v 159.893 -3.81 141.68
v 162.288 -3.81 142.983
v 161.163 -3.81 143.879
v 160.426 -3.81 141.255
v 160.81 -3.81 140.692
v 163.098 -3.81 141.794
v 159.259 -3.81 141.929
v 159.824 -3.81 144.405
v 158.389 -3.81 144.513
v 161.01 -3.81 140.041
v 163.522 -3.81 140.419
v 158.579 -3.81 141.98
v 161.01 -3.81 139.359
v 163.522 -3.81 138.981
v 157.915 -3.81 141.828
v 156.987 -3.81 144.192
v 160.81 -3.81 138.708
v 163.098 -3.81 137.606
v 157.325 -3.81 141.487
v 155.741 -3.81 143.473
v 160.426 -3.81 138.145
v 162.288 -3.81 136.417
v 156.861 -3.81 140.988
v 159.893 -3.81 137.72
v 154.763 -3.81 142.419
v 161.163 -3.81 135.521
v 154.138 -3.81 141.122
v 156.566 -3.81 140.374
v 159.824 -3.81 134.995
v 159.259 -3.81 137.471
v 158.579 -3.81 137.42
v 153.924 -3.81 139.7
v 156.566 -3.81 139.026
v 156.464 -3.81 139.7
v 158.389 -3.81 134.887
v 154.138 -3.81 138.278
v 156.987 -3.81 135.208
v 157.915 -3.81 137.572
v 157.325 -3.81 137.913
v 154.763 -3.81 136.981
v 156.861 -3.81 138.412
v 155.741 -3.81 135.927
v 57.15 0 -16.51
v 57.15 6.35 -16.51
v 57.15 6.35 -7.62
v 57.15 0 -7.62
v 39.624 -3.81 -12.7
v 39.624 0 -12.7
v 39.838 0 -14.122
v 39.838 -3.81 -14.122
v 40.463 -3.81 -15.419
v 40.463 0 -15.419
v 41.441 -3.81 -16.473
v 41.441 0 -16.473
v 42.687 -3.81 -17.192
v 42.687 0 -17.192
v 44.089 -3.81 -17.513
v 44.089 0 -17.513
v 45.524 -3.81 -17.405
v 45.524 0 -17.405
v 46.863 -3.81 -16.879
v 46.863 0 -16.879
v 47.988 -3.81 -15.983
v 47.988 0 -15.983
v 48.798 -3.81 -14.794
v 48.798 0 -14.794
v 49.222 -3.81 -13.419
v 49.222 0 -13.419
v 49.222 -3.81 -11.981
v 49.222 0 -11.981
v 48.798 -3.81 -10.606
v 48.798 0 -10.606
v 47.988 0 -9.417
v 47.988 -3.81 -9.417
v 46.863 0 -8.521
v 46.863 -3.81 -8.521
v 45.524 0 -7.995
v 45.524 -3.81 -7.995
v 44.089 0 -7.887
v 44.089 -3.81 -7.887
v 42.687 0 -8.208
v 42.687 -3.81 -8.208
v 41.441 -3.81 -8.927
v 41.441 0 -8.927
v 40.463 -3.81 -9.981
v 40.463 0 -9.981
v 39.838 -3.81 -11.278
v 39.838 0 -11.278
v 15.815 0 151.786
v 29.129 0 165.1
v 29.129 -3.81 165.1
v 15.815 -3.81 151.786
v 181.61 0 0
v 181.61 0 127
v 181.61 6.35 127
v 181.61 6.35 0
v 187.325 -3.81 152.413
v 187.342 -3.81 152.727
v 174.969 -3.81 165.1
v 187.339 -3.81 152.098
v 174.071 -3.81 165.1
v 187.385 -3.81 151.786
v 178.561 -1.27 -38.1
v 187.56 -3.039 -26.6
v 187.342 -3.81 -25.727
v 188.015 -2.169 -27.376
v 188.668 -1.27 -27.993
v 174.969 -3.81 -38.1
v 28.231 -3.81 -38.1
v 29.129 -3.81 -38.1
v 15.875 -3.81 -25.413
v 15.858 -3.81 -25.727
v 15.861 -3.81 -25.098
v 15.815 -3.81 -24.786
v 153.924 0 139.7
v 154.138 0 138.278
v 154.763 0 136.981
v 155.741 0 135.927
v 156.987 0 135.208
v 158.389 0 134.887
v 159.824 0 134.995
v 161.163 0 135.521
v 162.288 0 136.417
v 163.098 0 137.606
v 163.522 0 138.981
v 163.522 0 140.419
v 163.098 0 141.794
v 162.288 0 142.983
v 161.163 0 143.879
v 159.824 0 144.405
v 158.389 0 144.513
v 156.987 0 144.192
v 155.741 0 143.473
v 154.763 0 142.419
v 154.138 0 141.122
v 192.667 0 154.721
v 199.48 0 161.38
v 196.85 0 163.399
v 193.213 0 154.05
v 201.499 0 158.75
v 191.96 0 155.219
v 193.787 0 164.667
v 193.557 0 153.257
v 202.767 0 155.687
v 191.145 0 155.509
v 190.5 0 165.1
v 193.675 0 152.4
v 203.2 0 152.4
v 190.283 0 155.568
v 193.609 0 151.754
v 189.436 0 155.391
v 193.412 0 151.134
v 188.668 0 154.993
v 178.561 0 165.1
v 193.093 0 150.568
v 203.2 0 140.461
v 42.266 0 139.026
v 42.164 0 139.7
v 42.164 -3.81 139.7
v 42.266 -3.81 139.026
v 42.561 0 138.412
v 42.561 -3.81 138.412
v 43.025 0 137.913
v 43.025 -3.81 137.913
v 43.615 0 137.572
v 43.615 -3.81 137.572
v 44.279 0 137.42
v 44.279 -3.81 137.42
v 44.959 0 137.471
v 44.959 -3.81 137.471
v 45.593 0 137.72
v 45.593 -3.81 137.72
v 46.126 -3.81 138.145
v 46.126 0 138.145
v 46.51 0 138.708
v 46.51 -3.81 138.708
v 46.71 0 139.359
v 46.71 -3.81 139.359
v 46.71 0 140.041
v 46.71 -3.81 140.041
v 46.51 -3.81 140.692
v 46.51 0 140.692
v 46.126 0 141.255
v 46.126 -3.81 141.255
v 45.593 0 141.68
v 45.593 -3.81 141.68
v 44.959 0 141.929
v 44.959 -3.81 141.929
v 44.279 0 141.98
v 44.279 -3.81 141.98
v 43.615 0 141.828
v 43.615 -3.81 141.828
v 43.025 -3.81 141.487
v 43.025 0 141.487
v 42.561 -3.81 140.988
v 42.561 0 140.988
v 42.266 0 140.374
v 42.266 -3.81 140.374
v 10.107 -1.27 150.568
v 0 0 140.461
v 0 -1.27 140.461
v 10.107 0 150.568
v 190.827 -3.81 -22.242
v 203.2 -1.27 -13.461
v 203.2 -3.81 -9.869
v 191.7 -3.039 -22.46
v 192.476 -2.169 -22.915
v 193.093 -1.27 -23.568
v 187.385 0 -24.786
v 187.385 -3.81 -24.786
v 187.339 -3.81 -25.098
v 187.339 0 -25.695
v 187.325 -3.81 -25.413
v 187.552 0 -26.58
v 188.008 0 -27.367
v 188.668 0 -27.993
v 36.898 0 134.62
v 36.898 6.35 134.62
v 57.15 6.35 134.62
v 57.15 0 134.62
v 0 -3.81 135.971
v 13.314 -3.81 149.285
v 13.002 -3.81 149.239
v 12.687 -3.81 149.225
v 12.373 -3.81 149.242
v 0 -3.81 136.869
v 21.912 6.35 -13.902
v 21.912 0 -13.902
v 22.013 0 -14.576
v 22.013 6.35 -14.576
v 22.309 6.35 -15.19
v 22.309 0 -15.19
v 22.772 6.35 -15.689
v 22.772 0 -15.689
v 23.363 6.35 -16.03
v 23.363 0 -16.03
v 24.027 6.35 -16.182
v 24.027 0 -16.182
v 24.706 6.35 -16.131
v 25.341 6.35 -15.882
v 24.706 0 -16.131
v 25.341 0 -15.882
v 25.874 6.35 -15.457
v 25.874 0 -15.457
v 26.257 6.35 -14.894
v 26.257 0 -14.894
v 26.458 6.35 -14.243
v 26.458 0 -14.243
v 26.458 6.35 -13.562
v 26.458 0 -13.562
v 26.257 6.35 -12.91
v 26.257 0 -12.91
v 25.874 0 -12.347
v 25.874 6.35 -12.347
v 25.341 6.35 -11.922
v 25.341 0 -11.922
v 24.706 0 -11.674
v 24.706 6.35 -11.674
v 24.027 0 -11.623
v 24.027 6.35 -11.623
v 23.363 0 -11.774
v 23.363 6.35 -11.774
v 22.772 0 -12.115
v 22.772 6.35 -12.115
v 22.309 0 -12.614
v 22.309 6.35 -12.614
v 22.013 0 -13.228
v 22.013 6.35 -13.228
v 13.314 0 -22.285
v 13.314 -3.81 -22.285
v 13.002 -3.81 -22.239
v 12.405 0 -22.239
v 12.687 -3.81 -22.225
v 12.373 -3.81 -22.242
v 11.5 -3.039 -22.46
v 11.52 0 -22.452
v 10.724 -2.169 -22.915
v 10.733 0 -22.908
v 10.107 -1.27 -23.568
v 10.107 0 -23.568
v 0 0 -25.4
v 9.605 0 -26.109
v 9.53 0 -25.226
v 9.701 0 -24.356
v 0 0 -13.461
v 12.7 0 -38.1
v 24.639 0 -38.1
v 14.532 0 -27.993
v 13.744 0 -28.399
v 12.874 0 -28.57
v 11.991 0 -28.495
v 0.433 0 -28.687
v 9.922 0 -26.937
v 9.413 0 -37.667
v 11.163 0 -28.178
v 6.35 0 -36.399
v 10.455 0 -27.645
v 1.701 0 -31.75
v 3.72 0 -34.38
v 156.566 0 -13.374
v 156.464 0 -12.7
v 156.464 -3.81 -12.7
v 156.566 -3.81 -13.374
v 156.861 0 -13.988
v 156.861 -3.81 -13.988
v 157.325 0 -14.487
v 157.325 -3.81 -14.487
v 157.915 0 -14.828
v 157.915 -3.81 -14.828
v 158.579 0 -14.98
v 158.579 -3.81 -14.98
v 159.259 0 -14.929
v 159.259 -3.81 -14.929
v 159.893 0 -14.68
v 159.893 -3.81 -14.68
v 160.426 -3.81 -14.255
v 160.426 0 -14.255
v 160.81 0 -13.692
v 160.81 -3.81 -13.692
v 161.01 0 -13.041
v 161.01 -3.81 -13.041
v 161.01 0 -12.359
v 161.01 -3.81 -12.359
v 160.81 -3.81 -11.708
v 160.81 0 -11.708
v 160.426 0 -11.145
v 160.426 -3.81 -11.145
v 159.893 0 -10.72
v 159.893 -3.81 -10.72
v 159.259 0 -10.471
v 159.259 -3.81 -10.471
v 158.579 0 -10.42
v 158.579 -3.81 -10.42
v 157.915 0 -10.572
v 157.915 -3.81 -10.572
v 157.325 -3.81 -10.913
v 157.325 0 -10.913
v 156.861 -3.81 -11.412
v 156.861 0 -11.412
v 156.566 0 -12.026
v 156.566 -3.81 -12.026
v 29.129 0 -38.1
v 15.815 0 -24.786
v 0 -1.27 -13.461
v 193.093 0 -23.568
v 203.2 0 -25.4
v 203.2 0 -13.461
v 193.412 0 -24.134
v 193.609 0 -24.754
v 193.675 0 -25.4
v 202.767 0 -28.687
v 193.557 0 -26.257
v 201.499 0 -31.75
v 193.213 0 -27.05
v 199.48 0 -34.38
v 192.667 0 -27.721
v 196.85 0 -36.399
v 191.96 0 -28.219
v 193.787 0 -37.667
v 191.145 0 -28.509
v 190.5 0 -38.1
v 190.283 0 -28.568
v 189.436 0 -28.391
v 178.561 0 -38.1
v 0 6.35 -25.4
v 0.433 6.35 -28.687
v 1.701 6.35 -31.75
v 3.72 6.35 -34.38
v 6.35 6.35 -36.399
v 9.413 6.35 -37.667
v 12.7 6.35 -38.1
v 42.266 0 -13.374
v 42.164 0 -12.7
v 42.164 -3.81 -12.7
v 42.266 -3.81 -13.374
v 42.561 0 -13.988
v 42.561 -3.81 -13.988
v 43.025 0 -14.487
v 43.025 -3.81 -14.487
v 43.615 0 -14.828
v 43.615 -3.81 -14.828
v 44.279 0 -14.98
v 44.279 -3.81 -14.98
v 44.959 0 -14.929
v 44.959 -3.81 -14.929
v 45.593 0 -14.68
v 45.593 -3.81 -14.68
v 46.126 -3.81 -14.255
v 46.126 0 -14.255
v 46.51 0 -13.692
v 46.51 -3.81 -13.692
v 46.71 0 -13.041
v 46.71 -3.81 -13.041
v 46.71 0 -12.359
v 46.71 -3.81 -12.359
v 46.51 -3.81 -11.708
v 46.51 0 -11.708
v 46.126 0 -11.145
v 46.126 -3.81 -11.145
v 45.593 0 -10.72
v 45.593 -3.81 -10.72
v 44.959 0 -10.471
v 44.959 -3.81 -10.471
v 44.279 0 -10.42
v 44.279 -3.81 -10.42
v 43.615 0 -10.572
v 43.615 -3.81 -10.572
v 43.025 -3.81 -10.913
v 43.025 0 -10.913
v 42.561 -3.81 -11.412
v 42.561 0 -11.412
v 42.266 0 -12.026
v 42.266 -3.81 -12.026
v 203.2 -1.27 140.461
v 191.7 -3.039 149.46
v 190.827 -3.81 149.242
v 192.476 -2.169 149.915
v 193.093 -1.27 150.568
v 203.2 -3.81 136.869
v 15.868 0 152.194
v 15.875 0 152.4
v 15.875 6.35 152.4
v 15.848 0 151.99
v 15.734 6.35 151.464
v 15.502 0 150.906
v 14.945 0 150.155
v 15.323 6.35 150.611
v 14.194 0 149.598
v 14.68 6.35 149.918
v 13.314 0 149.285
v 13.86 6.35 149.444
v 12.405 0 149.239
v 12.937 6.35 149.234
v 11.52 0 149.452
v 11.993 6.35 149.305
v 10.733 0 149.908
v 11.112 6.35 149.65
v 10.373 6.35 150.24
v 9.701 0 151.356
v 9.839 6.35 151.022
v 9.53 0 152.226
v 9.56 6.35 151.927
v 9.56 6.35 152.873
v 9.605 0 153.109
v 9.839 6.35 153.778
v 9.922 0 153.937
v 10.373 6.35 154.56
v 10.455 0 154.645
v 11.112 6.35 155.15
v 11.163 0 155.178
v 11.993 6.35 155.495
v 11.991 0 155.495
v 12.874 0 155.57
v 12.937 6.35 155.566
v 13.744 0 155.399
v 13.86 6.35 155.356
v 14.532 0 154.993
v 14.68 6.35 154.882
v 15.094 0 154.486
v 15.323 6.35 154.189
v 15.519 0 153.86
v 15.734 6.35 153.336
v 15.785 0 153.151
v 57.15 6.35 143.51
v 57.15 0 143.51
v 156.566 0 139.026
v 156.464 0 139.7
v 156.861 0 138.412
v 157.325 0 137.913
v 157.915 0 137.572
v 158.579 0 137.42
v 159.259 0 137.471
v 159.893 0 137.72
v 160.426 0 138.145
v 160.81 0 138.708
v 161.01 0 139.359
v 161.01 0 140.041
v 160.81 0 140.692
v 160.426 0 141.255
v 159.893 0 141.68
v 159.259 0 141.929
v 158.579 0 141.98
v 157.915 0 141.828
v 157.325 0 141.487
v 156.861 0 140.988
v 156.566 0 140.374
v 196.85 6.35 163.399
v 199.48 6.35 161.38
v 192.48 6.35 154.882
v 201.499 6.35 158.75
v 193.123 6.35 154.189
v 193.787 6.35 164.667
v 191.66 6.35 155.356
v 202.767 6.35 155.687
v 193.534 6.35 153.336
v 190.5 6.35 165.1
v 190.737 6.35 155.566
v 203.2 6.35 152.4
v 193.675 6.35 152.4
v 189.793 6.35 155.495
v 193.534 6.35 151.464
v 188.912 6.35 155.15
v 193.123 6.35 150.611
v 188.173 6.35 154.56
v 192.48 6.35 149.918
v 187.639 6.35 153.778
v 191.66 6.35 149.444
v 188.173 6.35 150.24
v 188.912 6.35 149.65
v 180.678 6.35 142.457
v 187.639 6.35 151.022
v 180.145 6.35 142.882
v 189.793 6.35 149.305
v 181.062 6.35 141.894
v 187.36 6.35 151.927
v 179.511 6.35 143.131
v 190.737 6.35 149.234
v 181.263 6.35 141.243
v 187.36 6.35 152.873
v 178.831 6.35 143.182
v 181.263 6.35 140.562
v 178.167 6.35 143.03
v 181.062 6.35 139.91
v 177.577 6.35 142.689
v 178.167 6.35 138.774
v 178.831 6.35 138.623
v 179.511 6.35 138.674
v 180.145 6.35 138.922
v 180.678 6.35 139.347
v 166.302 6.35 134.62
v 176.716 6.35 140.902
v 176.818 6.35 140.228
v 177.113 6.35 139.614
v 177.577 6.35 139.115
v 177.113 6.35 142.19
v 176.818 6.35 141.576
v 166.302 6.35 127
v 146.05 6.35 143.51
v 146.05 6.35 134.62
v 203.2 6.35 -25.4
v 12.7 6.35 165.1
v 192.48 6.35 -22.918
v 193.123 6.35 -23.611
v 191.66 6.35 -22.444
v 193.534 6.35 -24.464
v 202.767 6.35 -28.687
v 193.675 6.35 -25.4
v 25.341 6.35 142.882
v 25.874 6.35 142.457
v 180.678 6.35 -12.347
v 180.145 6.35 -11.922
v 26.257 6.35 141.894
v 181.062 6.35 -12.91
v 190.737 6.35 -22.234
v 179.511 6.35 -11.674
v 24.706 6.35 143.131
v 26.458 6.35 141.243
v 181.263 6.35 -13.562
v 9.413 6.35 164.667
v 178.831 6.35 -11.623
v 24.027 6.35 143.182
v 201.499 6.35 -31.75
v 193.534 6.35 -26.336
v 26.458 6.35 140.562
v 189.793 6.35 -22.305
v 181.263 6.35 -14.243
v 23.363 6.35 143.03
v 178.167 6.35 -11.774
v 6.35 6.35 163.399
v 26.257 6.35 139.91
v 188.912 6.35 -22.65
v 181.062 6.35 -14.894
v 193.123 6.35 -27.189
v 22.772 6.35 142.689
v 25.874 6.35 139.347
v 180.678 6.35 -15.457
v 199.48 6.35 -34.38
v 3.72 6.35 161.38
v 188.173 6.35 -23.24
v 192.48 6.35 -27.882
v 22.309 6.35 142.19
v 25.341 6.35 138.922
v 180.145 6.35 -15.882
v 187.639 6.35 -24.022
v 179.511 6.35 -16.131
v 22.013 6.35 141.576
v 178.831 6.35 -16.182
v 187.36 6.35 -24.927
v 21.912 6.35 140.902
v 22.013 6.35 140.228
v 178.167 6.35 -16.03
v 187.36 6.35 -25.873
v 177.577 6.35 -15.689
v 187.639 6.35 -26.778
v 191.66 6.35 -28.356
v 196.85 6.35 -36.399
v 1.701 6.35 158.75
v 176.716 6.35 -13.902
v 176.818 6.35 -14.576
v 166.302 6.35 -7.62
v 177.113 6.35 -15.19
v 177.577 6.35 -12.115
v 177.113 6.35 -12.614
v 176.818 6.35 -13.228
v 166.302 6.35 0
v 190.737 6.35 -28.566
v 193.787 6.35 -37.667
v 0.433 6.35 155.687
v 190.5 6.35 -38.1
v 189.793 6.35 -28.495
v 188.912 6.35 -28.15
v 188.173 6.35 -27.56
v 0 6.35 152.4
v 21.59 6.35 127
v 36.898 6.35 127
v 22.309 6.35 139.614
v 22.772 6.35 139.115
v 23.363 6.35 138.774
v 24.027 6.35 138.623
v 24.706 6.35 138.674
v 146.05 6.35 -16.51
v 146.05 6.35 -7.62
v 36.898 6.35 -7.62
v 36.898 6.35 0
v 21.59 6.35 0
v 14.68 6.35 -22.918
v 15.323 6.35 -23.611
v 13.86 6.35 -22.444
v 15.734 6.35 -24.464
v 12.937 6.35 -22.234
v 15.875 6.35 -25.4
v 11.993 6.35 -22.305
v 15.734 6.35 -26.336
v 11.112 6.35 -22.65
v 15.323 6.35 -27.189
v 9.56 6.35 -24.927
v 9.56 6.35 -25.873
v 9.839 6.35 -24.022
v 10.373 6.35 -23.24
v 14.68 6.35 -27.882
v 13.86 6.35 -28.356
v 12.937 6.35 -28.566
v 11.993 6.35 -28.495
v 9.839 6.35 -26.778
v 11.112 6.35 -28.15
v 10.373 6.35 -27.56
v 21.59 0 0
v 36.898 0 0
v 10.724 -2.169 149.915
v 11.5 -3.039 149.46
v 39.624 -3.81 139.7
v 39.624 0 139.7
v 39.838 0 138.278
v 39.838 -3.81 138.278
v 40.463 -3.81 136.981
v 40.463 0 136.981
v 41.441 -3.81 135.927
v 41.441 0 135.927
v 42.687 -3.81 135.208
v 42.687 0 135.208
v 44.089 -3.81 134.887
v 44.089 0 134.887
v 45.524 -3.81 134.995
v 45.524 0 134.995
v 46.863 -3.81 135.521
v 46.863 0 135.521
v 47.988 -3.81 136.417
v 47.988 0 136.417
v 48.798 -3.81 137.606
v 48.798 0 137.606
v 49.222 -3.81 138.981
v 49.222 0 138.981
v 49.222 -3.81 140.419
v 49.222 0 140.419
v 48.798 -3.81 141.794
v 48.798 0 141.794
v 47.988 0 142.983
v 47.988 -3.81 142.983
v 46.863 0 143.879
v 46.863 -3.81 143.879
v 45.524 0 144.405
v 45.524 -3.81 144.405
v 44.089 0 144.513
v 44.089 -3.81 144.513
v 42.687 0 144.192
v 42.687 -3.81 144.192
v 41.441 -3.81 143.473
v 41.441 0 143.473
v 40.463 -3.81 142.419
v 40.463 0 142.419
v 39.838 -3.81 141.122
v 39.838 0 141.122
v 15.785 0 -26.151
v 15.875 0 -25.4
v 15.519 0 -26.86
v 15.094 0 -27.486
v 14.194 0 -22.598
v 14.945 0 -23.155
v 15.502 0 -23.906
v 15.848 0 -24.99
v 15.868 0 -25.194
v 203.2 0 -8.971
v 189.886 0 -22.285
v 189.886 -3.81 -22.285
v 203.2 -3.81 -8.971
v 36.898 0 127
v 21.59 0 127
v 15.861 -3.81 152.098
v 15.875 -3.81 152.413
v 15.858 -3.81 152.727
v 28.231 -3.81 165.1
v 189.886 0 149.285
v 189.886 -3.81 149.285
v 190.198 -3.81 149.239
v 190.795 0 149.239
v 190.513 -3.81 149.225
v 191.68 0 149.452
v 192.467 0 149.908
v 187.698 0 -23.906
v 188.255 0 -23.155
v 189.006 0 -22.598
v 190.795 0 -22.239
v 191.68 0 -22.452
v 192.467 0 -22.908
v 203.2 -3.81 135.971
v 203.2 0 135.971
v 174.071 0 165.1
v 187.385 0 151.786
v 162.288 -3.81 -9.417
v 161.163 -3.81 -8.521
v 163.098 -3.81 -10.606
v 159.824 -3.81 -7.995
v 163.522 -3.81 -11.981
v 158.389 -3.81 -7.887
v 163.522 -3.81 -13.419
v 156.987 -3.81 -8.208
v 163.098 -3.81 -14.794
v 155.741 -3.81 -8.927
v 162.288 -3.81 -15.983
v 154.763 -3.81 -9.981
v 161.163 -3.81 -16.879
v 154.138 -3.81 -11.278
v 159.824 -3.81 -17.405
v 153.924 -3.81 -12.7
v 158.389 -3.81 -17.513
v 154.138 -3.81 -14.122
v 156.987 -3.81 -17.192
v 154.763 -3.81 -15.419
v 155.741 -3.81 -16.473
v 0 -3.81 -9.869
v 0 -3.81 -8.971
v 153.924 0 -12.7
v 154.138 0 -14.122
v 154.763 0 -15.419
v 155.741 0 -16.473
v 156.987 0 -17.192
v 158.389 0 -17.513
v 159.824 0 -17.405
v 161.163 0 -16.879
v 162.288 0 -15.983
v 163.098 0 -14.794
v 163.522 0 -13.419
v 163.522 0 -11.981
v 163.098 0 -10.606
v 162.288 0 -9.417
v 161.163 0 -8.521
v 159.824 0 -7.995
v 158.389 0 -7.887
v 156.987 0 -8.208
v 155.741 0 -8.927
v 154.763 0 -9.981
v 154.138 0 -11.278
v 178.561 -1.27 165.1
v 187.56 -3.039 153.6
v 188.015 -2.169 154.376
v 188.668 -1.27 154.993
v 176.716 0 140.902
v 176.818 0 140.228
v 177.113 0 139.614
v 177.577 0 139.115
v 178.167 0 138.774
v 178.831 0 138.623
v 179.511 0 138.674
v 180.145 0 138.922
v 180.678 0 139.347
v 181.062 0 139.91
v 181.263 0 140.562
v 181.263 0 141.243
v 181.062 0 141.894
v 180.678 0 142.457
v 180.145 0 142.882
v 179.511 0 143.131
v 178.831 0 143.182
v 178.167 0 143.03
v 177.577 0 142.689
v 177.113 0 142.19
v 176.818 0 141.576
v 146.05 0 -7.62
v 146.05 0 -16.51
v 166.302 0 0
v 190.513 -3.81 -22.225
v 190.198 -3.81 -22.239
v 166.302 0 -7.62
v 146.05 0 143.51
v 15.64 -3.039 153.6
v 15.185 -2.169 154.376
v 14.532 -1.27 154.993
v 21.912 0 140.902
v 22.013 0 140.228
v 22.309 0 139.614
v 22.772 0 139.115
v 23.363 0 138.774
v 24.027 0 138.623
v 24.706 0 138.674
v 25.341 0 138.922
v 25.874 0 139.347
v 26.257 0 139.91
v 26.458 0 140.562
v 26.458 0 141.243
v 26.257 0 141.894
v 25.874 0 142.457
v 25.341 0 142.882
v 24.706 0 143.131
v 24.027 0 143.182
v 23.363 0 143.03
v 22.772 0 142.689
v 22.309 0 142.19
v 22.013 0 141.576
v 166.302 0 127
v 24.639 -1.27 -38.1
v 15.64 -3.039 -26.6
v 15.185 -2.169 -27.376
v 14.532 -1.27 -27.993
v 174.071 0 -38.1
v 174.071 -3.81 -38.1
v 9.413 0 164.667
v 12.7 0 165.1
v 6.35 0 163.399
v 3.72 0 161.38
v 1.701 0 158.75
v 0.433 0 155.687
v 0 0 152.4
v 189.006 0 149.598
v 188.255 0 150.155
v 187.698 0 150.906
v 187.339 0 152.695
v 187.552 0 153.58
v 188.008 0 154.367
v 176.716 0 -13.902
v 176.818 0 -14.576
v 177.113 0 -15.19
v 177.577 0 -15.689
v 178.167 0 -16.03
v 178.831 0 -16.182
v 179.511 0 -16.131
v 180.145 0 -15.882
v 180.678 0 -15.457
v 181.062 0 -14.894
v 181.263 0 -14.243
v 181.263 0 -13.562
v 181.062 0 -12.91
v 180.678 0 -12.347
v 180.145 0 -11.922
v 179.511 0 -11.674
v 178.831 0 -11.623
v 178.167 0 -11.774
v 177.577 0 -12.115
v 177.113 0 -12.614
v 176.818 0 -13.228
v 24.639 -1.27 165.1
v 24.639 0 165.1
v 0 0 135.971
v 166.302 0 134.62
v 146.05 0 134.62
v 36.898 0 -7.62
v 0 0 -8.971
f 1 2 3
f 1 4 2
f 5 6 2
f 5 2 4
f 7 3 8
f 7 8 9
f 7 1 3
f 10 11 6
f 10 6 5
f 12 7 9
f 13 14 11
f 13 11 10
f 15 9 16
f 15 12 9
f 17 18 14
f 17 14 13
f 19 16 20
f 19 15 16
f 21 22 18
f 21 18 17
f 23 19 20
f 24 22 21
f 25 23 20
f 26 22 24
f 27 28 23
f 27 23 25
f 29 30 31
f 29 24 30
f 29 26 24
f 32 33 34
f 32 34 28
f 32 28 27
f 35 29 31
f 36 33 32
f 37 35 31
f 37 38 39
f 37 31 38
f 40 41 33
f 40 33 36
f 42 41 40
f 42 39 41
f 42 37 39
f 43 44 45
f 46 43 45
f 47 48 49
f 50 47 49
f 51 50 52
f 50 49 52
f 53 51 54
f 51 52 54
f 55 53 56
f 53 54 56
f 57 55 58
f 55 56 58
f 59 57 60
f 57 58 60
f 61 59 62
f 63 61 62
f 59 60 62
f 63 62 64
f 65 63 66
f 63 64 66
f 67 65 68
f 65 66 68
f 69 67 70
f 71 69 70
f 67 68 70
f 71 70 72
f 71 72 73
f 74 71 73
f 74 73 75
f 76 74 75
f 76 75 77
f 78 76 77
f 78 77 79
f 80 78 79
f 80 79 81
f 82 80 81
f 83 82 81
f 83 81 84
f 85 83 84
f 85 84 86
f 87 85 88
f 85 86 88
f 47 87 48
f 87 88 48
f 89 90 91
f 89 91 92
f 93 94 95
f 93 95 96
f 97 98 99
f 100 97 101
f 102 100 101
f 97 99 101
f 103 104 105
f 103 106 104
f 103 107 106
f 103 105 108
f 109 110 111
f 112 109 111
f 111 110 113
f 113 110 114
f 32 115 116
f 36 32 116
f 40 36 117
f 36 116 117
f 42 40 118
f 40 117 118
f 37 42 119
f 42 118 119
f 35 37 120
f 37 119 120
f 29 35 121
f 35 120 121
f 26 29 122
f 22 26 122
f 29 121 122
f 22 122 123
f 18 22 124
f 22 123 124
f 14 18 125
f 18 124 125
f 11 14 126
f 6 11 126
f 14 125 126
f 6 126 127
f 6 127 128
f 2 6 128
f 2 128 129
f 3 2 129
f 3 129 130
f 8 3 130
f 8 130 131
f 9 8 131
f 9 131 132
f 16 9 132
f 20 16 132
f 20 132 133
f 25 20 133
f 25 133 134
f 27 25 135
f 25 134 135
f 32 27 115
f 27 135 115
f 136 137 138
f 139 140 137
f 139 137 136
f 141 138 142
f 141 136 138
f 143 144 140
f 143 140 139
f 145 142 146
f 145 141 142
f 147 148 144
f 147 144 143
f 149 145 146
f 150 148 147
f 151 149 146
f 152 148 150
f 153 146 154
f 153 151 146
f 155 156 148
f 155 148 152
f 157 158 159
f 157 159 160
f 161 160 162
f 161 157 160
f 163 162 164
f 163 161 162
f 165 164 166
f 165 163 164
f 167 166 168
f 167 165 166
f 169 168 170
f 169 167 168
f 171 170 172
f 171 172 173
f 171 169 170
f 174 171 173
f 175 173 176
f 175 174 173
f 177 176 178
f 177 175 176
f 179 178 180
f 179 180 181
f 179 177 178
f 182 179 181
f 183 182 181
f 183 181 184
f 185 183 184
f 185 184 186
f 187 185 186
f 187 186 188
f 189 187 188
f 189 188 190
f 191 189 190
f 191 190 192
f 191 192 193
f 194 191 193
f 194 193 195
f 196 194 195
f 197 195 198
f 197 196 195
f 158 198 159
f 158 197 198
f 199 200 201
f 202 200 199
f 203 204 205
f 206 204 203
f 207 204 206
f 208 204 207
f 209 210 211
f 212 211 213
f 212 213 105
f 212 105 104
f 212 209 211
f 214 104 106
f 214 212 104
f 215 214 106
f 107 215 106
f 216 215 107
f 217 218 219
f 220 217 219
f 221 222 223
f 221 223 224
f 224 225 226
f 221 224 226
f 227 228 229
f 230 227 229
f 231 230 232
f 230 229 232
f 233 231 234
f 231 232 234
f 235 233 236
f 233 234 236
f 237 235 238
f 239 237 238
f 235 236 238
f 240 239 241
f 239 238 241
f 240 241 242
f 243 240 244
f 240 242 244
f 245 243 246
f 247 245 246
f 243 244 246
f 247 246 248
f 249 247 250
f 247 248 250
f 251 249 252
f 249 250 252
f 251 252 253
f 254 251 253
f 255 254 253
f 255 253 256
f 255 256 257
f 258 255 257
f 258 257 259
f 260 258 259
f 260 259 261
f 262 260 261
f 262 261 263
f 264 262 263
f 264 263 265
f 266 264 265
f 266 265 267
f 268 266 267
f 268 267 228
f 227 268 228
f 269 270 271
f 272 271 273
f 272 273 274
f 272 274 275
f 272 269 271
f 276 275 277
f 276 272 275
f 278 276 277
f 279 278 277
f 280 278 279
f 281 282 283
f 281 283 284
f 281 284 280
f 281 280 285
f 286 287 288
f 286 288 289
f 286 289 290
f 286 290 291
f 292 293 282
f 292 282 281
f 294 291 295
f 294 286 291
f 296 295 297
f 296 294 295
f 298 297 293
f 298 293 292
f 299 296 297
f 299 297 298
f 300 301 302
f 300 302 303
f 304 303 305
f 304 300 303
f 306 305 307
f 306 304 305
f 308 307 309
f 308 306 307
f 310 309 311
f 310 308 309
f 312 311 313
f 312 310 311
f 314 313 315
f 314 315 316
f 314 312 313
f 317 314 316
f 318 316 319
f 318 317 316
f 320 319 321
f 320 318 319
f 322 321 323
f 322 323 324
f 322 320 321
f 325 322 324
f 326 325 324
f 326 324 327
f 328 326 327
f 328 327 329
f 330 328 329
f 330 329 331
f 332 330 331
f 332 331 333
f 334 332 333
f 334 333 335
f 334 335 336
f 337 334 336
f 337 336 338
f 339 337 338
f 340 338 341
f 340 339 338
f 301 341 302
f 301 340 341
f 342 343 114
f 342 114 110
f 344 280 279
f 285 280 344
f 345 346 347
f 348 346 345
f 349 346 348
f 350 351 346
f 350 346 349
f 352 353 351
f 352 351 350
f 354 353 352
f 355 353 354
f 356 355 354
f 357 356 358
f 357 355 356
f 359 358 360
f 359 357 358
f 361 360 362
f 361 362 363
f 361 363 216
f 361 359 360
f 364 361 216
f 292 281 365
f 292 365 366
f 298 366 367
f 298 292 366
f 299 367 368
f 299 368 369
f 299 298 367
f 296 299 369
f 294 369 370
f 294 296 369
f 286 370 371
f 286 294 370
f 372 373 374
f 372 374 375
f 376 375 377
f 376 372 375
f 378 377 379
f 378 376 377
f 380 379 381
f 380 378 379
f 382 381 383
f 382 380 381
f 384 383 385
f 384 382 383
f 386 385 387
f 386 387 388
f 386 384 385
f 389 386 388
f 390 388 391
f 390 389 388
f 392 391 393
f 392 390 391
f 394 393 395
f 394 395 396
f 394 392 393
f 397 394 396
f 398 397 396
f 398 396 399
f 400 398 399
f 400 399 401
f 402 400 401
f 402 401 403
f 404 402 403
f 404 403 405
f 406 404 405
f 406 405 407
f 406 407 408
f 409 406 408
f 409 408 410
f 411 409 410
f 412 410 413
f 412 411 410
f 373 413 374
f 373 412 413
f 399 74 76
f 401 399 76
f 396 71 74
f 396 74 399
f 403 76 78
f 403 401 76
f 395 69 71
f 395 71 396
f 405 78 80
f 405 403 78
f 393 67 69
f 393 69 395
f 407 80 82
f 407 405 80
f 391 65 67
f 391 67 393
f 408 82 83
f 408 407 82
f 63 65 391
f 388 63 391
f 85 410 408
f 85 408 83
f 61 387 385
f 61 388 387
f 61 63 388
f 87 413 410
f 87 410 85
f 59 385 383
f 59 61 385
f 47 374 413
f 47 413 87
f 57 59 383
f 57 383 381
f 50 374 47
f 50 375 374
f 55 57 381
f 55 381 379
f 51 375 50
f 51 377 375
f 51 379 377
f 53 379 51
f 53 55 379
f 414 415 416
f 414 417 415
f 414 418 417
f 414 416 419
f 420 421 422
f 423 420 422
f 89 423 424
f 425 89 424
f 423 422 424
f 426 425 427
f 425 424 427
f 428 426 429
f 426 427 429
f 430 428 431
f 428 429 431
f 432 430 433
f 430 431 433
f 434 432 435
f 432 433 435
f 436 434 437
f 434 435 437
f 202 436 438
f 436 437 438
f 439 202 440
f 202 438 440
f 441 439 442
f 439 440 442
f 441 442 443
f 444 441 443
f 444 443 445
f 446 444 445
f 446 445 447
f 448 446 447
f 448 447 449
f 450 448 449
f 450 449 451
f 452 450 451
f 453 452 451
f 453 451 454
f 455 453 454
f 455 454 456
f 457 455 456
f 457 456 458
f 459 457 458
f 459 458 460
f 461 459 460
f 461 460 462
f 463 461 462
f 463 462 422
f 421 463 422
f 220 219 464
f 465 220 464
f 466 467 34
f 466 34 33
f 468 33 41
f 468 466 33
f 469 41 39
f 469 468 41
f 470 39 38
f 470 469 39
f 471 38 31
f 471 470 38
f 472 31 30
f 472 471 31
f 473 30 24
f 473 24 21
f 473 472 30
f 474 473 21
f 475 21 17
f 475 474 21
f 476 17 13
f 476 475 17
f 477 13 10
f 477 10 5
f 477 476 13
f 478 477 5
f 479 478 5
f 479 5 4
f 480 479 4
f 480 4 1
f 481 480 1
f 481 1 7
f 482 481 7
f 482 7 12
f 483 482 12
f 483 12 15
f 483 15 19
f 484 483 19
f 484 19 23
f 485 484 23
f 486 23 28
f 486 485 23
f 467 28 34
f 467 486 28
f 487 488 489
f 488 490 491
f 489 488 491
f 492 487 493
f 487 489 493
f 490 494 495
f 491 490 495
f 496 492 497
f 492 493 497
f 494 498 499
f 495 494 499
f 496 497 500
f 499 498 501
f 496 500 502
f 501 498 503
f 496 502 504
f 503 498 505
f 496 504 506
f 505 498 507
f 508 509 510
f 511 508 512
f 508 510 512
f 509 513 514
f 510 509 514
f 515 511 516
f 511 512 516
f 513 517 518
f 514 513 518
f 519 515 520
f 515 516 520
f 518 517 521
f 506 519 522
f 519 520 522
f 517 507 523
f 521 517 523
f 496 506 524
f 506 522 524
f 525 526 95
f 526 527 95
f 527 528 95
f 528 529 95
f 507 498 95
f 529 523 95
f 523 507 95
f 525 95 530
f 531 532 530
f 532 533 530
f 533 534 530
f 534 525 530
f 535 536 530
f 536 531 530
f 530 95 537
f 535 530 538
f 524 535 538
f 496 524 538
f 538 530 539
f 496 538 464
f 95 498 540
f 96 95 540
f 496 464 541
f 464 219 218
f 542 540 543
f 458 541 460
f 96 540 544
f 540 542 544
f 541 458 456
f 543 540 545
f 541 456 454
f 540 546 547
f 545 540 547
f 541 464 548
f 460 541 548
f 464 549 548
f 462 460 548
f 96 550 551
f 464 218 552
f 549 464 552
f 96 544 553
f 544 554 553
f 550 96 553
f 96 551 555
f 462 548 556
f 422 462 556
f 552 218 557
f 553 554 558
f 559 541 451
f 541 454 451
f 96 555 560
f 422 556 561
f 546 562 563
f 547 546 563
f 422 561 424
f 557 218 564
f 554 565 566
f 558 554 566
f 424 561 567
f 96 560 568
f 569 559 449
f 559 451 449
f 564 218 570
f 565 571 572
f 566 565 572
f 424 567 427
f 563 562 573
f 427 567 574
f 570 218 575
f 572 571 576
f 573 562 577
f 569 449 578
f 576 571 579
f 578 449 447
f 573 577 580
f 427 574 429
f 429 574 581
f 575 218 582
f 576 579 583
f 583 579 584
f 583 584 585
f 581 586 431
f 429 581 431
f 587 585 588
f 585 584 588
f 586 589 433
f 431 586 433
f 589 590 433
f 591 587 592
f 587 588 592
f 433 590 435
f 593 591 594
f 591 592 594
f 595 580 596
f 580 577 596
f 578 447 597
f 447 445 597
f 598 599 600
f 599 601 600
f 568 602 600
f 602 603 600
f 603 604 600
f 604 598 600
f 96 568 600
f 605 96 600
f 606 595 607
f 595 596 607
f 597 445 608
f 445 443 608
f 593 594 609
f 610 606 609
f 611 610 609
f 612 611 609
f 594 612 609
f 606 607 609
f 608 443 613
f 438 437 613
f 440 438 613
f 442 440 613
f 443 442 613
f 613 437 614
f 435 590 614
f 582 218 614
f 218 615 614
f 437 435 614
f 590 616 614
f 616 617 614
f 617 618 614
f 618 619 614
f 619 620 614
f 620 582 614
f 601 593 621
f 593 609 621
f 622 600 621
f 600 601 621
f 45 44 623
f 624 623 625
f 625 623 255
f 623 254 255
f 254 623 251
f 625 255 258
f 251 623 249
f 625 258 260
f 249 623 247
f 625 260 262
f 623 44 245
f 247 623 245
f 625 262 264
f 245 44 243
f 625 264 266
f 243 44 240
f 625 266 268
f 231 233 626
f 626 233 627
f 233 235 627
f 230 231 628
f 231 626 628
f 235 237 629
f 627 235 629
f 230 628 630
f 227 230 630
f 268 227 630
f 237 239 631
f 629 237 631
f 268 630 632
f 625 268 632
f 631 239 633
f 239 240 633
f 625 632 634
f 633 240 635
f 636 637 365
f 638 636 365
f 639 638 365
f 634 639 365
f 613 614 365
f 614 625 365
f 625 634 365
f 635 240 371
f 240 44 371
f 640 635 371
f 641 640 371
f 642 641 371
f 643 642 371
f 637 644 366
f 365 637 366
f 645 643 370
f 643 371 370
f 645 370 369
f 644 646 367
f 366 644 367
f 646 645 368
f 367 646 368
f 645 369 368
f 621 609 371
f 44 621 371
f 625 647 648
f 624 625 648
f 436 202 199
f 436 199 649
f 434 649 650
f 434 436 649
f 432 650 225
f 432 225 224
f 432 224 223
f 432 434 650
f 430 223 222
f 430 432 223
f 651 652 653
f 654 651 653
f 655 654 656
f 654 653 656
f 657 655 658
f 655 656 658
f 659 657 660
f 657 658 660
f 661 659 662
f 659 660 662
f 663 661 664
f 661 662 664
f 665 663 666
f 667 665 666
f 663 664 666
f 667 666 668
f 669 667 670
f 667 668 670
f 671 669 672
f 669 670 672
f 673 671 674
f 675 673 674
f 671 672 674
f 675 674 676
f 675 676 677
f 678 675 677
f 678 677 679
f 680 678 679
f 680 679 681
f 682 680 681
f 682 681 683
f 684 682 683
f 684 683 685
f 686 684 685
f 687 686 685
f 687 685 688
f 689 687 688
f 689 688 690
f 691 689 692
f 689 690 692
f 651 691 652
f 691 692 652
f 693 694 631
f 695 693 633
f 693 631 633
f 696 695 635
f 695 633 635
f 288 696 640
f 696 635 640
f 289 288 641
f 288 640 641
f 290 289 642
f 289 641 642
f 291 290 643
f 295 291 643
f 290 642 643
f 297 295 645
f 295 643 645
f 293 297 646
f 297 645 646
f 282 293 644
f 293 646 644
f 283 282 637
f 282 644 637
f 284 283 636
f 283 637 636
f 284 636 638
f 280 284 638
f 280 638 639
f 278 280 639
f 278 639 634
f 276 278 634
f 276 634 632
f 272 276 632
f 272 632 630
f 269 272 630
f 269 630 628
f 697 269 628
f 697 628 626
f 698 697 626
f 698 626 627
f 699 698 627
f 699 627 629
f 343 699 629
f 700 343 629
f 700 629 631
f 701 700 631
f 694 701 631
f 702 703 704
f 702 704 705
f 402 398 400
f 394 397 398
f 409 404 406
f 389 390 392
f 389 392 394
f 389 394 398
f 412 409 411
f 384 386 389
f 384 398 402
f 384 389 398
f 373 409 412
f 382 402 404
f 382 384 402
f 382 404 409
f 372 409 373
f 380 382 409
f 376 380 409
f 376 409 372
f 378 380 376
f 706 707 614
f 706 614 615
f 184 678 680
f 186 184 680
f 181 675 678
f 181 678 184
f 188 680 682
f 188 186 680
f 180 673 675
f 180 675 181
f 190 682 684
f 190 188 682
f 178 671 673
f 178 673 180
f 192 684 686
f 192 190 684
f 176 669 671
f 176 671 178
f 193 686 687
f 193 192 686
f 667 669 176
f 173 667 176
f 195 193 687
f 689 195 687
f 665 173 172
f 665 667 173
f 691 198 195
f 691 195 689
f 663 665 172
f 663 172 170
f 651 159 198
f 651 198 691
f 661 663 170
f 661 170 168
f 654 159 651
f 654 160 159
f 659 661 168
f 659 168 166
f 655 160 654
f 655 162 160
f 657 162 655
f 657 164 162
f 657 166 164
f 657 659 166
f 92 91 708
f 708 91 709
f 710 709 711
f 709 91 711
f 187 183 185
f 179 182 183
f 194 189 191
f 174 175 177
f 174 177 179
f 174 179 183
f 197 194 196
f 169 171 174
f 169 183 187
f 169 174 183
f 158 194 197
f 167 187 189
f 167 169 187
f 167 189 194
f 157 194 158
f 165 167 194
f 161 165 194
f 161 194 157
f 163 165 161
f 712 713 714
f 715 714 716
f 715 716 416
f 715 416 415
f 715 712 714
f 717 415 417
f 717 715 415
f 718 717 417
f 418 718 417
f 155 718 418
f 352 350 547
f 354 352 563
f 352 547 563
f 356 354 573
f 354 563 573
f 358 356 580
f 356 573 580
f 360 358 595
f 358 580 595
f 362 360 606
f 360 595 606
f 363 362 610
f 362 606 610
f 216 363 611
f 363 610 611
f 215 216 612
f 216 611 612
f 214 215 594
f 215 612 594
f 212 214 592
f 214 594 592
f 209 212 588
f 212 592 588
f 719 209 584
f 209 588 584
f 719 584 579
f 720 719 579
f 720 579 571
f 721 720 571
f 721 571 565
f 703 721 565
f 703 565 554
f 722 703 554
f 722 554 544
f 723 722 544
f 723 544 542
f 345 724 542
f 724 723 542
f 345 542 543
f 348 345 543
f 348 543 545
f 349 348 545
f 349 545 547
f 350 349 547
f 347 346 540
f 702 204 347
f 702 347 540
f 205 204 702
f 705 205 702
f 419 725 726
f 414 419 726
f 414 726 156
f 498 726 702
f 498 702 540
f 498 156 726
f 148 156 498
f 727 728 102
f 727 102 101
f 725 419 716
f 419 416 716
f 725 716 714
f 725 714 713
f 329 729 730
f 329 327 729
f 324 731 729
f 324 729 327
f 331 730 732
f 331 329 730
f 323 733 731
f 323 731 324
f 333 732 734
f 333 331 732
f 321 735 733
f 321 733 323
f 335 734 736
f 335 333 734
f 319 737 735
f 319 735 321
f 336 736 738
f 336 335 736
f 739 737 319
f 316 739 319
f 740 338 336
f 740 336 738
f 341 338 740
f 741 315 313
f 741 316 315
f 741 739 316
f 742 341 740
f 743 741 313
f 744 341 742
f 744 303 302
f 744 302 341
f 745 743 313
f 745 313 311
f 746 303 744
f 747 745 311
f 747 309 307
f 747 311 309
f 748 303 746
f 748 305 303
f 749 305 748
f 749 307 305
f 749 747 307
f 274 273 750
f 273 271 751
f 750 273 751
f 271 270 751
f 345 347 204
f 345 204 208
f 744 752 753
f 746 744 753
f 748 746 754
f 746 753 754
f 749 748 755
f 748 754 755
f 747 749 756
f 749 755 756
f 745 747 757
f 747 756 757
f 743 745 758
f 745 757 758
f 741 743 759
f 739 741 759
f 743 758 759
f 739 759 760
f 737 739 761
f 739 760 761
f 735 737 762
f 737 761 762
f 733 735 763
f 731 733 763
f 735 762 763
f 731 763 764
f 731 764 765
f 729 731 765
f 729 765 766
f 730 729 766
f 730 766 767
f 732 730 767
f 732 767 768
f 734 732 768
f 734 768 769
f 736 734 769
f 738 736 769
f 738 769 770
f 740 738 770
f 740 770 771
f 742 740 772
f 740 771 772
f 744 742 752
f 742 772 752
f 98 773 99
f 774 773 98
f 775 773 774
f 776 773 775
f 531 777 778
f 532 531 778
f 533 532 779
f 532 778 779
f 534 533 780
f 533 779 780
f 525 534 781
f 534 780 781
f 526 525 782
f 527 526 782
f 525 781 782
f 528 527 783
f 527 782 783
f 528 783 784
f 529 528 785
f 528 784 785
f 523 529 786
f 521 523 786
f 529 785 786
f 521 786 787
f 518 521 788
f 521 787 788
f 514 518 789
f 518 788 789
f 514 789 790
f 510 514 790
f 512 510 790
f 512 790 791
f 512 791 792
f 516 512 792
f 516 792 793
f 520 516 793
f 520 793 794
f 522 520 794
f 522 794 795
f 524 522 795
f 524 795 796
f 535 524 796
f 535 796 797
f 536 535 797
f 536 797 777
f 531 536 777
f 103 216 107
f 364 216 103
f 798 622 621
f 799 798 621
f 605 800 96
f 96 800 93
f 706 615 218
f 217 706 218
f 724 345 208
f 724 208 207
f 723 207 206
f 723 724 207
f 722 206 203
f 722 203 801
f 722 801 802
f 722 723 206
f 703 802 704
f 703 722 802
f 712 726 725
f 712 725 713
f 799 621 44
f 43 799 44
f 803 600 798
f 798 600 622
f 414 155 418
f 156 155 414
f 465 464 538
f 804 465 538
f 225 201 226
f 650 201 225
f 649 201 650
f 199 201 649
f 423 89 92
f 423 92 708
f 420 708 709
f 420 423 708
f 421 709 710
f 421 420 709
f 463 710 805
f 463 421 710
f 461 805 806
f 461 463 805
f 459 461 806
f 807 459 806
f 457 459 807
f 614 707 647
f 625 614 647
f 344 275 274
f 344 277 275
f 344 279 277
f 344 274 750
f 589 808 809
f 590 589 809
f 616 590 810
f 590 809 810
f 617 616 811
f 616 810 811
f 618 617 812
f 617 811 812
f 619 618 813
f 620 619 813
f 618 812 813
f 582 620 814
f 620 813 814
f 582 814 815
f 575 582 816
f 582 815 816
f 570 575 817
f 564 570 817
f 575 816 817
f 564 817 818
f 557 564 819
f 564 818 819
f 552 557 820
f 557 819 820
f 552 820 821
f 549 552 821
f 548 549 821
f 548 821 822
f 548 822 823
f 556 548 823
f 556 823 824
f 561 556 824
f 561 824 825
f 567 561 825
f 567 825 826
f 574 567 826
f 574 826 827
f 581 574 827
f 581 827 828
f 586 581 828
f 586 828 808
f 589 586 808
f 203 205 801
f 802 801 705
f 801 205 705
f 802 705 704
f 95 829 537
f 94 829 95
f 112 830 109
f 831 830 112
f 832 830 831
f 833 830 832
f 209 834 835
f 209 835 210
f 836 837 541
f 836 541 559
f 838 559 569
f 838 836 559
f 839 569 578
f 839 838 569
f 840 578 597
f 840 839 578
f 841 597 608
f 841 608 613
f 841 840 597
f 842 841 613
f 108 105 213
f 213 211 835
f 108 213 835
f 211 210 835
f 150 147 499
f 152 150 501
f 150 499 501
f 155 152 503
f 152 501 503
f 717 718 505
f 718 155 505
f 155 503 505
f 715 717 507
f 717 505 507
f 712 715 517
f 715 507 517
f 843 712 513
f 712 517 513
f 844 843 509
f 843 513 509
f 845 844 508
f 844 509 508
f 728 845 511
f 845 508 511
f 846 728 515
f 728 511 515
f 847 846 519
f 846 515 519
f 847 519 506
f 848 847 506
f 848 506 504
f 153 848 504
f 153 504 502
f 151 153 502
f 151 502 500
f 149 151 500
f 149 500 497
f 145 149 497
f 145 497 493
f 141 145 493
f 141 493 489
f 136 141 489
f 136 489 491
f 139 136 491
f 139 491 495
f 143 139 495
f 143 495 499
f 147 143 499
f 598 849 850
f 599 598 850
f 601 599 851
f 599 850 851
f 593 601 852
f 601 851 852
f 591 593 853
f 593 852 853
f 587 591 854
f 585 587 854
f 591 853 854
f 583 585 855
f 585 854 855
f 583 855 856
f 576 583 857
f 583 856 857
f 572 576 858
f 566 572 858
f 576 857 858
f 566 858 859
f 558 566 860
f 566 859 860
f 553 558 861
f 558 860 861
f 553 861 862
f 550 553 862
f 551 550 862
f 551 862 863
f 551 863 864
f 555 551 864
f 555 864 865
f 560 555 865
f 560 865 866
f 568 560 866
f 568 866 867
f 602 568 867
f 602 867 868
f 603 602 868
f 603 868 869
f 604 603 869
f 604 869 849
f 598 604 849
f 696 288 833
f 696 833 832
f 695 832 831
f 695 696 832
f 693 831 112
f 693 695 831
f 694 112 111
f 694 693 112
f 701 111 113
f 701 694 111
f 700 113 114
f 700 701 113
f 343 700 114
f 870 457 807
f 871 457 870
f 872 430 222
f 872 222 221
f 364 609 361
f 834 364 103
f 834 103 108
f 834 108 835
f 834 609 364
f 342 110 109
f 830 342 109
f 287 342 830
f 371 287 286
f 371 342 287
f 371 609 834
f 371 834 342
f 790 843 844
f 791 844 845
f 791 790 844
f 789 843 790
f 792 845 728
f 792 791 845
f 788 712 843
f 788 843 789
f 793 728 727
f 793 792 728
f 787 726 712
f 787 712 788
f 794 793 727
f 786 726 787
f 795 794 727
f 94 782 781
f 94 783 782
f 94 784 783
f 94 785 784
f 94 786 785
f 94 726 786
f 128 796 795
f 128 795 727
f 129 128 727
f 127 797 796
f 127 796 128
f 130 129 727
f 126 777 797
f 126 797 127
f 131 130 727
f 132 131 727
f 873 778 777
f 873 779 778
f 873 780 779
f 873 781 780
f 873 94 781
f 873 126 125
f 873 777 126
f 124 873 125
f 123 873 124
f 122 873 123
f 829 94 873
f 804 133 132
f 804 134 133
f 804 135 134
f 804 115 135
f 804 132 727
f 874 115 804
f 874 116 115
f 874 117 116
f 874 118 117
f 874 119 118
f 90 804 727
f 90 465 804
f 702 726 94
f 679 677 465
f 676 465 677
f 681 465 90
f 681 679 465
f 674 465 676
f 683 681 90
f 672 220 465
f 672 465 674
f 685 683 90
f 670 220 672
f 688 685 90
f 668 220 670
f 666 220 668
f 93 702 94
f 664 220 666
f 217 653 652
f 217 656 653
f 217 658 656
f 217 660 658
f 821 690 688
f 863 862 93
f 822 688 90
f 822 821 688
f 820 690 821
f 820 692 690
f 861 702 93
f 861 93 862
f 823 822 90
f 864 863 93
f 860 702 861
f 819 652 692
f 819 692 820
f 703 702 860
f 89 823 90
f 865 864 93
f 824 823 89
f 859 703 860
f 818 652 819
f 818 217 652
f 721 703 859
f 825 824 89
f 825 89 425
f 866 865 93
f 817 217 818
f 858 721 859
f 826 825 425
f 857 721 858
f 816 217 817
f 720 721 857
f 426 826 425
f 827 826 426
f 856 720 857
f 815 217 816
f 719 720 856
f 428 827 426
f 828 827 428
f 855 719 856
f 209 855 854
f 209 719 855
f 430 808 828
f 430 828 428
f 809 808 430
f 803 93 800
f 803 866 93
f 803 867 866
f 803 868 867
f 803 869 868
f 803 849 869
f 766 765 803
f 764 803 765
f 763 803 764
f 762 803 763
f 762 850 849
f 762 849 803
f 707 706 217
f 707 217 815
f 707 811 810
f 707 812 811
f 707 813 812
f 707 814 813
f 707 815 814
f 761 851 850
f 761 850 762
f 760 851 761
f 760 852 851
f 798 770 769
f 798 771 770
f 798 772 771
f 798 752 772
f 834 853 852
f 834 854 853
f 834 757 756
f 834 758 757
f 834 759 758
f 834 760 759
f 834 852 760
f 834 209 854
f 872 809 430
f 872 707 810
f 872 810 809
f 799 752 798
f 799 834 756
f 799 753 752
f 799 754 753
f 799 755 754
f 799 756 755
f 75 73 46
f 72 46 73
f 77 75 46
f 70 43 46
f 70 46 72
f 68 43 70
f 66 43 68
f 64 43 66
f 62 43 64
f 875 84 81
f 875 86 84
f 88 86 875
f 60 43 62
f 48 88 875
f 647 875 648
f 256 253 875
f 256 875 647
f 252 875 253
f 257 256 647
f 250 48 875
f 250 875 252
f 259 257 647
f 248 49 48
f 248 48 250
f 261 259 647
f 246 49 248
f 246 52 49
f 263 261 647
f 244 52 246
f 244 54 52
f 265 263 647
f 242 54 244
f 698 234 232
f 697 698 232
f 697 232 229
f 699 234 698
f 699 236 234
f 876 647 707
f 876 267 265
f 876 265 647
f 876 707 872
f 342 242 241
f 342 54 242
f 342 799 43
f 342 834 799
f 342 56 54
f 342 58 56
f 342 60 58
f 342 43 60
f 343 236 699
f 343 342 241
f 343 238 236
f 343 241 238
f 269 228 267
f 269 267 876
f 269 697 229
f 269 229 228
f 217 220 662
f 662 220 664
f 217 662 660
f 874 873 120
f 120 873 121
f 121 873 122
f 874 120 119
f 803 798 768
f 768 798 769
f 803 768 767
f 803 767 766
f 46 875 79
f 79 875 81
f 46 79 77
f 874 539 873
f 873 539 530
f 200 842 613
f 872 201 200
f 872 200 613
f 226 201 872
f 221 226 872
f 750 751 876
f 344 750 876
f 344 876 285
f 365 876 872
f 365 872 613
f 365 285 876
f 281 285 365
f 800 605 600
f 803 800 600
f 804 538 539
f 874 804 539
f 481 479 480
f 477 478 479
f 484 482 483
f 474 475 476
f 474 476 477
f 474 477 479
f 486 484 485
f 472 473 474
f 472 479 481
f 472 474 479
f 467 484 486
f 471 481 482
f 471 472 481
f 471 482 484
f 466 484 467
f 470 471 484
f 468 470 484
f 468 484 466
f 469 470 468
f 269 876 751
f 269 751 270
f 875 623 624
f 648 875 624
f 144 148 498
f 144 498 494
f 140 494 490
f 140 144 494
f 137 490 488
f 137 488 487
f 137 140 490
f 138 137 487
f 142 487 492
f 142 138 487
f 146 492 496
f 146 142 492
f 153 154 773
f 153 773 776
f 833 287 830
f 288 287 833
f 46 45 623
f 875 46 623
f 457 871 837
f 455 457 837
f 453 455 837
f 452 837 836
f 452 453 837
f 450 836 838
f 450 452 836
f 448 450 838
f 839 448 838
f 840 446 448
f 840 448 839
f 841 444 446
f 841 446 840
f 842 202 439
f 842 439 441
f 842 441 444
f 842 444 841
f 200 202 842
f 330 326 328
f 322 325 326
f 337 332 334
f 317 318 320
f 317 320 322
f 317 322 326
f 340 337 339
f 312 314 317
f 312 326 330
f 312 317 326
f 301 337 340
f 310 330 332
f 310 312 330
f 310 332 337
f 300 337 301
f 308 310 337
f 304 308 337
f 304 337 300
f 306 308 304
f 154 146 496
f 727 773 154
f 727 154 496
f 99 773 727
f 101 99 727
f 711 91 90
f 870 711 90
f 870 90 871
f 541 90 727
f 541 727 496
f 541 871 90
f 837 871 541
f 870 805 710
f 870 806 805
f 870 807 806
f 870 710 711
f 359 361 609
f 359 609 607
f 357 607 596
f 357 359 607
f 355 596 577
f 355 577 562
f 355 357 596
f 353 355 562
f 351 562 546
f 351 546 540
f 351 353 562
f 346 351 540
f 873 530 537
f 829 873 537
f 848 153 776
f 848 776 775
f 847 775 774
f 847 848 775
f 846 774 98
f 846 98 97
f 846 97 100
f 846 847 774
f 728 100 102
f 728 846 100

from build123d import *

# Parameters (mm, degrees)
SKETCH1_W           = 160.02
SKETCH1_H           = 127
BOSS_EXTRUDE2_DEPTH = 6.35
SKETCH2_R           = 3.175
CUT_EXTRUDE1_DEPTH  = 7.35
SKETCH8_R           = 2.286
CUT_EXTRUDE4_DEPTH  = 7.35
SKETCH10_R          = 4.826
SKETCH10_R_2        = 2.286
BOSS_EXTRUDE3_DEPTH = 3.81
BOSS_EXTRUDE4_DEPTH = 3.81
CHAMFER1_SIZE       = 2.54
CUT_EXTRUDE5_DEPTH  = 11.16


with BuildPart() as part:
    # Sketch1 → Boss-Extrude2 (new body)
    with BuildSketch(Plane(origin=(0, 0, 0), x_dir=(1, 0, 0), z_dir=(0, 1, 0))):
        with BuildLine():
            Line((0, 0), (0, 25.4))
            ThreePointArc((0, 25.4), (3.719743879, 34.380256121), (12.7, 38.1))
            Line((12.7, 38.1), (190.5, 38.1))
            ThreePointArc((190.5, 38.1), (199.480256121, 34.380256121), (203.2, 25.4))
            Line((203.2, 25.4), (203.2, -152.4))
            ThreePointArc((203.2, -152.4), (199.480256121, -161.380256121), (190.5, -165.1))
            Line((190.5, -165.1), (12.7, -165.1))
            ThreePointArc((12.7, -165.1), (3.719743879, -161.380256121), (0, -152.4))
            Line((0, -152.4), (0, -127))
            Line((0, -127), (0, 0))
        make_face()
        with Locations((101.6, -63.5)):
            Rectangle(SKETCH1_W, SKETCH1_H, mode=Mode.SUBTRACT)
    extrude(amount=BOSS_EXTRUDE2_DEPTH)

    # Sketch2 → Cut-Extrude1 (cut, through all)
    with BuildSketch(Plane(origin=(0, 6.35, 0), x_dir=(1, 0, 0), z_dir=(0, 1, 0))):
        with Locations((12.7, 25.4)):
            Circle(SKETCH2_R)
        with Locations((190.5, 25.4)):
            Circle(SKETCH2_R)
        with Locations((190.5, -152.4)):
            Circle(SKETCH2_R)
        with Locations((12.7, -152.4)):
            Circle(SKETCH2_R)
    extrude(amount=-CUT_EXTRUDE1_DEPTH, mode=Mode.SUBTRACT)

    # Sketch8 → Cut-Extrude4 (cut, through all)
    with BuildSketch(Plane(origin=(0, 0, 0), x_dir=(-1, 0, 0), z_dir=(0, -1, 0))):
        with Locations((-24.197781122, 13.902218878)):
            Circle(SKETCH8_R)
        with Locations((-24.197781122, -140.902218878)):
            Circle(SKETCH8_R)
        with Locations((-179.002218878, -140.902218878)):
            Circle(SKETCH8_R)
        with Locations((-179.002218878, 13.902218878)):
            Circle(SKETCH8_R)
    extrude(amount=-CUT_EXTRUDE4_DEPTH, mode=Mode.SUBTRACT)

    # Sketch10 → Boss-Extrude3 (add)
    with BuildSketch(Plane(origin=(0, 0, 0), x_dir=(-1, 0, 0), z_dir=(0, -1, 0))):
        with Locations((-44.45, 12.7)):
            Circle(SKETCH10_R)
        with Locations((-44.45, 12.7)):
            Circle(SKETCH10_R_2, mode=Mode.SUBTRACT)
        with Locations((-158.75, 12.7)):
            Circle(SKETCH10_R)
        with Locations((-158.75, 12.7)):
            Circle(SKETCH10_R_2, mode=Mode.SUBTRACT)
        with Locations((-158.75, -139.7)):
            Circle(SKETCH10_R)
        with Locations((-158.75, -139.7)):
            Circle(SKETCH10_R_2, mode=Mode.SUBTRACT)
        with Locations((-44.45, -139.7)):
            Circle(SKETCH10_R)
        with Locations((-44.45, -139.7)):
            Circle(SKETCH10_R_2, mode=Mode.SUBTRACT)
    extrude(amount=BOSS_EXTRUDE3_DEPTH)

    # Sketch11 → Boss-Extrude4 (add)
    with BuildSketch(Plane.XZ):
        with BuildLine():
            Line((174.07128, -38.1), (187.384850533, -24.786429467))
            ThreePointArc((187.384850533, -24.786429467), (187.552268433, -26.579620112), (188.668154157, -27.993253903))
            Line((188.668154157, -27.993253903), (178.561408061, -38.1))
            Line((178.561408061, -38.1), (174.07128, -38.1))
        make_face()
        with BuildLine():
            Line((203.2, -8.97128), (203.2, -13.461408061))
            Line((203.2, -13.461408061), (193.093253903, -23.568154157))
            ThreePointArc((193.093253903, -23.568154157), (191.679620112, -22.452268433), (189.886429467, -22.284850533))
            Line((189.886429467, -22.284850533), (203.2, -8.97128))
        make_face()
        with BuildLine():
            Line((10.106746097, -23.568154157), (0, -13.461408061))
            Line((0, -13.461408061), (0, -8.97128))
            Line((0, -8.97128), (13.313570533, -22.284850533))
            ThreePointArc((13.313570533, -22.284850533), (11.520379888, -22.452268433), (10.106746097, -23.568154157))
        make_face()
        with BuildLine():
            Line((15.815149467, -24.786429467), (29.12872, -38.1))
            Line((29.12872, -38.1), (24.638591939, -38.1))
            Line((24.638591939, -38.1), (14.531845843, -27.993253903))
            ThreePointArc((14.531845843, -27.993253903), (15.647731567, -26.579620112), (15.815149467, -24.786429467))
        make_face()
        with BuildLine():
            Line((14.531845843, 154.993253903), (24.638591939, 165.1))
            Line((24.638591939, 165.1), (29.12872, 165.1))
            Line((29.12872, 165.1), (15.815149467, 151.786429467))
            ThreePointArc((15.815149467, 151.786429467), (15.647731567, 153.579620112), (14.531845843, 154.993253903))
        make_face()
        with BuildLine():
            Line((13.313570533, 149.284850533), (0, 135.97128))
            Line((0, 135.97128), (0, 140.461408061))
            Line((0, 140.461408061), (10.106746097, 150.568154157))
            ThreePointArc((10.106746097, 150.568154157), (11.520379888, 149.452268433), (13.313570533, 149.284850533))
        make_face()
        with BuildLine():
            Line((193.093253903, 150.568154157), (203.2, 140.461408061))
            Line((203.2, 140.461408061), (203.2, 135.97128))
            Line((203.2, 135.97128), (189.886429467, 149.284850533))
            ThreePointArc((189.886429467, 149.284850533), (191.679620112, 149.452268433), (193.093253903, 150.568154157))
        make_face()
        with BuildLine():
            Line((187.384850533, 151.786429467), (174.07128, 165.1))
            Line((174.07128, 165.1), (178.561408061, 165.1))
            Line((178.561408061, 165.1), (188.668154157, 154.993253903))
            ThreePointArc((188.668154157, 154.993253903), (187.552268433, 153.579620112), (187.384850533, 151.786429467))
        make_face()
    extrude(amount=BOSS_EXTRUDE4_DEPTH)

    # Chamfer1
    chamfer1_edges = [part.edges().sort_by_distance(p)[0] for p in [
        (183.614781109, -3.81, -33.046626952),
        (198.146626952, -3.81, -18.514781109),
        (5.053373048, -3.81, -18.514781109),
        (19.585218891, -3.81, -33.046626952),
        (19.585218891, -3.81, 160.046626952),
        (5.053373048, -3.81, 145.514781109),
        (198.146626952, -3.81, 145.514781109),
        (183.614781109, -3.81, 160.046626952),
    ]]
    chamfer(chamfer1_edges, length=CHAMFER1_SIZE)

    # Sketch9 → Cut-Extrude5 (cut, through all)
    with BuildSketch(Plane(origin=(0, 6.35, 0), x_dir=(1, 0, 0), z_dir=(0, 1, 0))):
        Polygon((36.897781122, 0), (166.302218878, 0), (166.302218878, 7.62), (146.05, 7.62), (146.05, 16.51), (57.15, 16.51), (57.15, 7.62), (36.897781122, 7.62), align=None)
        Polygon((166.302218878, -127), (36.897781122, -127), (36.897781122, -134.62), (57.15, -134.62), (57.15, -143.51), (146.05, -143.51), (146.05, -134.62), (166.302218878, -134.62), align=None)
    extrude(amount=-CUT_EXTRUDE5_DEPTH, mode=Mode.SUBTRACT)


solid = part.part
